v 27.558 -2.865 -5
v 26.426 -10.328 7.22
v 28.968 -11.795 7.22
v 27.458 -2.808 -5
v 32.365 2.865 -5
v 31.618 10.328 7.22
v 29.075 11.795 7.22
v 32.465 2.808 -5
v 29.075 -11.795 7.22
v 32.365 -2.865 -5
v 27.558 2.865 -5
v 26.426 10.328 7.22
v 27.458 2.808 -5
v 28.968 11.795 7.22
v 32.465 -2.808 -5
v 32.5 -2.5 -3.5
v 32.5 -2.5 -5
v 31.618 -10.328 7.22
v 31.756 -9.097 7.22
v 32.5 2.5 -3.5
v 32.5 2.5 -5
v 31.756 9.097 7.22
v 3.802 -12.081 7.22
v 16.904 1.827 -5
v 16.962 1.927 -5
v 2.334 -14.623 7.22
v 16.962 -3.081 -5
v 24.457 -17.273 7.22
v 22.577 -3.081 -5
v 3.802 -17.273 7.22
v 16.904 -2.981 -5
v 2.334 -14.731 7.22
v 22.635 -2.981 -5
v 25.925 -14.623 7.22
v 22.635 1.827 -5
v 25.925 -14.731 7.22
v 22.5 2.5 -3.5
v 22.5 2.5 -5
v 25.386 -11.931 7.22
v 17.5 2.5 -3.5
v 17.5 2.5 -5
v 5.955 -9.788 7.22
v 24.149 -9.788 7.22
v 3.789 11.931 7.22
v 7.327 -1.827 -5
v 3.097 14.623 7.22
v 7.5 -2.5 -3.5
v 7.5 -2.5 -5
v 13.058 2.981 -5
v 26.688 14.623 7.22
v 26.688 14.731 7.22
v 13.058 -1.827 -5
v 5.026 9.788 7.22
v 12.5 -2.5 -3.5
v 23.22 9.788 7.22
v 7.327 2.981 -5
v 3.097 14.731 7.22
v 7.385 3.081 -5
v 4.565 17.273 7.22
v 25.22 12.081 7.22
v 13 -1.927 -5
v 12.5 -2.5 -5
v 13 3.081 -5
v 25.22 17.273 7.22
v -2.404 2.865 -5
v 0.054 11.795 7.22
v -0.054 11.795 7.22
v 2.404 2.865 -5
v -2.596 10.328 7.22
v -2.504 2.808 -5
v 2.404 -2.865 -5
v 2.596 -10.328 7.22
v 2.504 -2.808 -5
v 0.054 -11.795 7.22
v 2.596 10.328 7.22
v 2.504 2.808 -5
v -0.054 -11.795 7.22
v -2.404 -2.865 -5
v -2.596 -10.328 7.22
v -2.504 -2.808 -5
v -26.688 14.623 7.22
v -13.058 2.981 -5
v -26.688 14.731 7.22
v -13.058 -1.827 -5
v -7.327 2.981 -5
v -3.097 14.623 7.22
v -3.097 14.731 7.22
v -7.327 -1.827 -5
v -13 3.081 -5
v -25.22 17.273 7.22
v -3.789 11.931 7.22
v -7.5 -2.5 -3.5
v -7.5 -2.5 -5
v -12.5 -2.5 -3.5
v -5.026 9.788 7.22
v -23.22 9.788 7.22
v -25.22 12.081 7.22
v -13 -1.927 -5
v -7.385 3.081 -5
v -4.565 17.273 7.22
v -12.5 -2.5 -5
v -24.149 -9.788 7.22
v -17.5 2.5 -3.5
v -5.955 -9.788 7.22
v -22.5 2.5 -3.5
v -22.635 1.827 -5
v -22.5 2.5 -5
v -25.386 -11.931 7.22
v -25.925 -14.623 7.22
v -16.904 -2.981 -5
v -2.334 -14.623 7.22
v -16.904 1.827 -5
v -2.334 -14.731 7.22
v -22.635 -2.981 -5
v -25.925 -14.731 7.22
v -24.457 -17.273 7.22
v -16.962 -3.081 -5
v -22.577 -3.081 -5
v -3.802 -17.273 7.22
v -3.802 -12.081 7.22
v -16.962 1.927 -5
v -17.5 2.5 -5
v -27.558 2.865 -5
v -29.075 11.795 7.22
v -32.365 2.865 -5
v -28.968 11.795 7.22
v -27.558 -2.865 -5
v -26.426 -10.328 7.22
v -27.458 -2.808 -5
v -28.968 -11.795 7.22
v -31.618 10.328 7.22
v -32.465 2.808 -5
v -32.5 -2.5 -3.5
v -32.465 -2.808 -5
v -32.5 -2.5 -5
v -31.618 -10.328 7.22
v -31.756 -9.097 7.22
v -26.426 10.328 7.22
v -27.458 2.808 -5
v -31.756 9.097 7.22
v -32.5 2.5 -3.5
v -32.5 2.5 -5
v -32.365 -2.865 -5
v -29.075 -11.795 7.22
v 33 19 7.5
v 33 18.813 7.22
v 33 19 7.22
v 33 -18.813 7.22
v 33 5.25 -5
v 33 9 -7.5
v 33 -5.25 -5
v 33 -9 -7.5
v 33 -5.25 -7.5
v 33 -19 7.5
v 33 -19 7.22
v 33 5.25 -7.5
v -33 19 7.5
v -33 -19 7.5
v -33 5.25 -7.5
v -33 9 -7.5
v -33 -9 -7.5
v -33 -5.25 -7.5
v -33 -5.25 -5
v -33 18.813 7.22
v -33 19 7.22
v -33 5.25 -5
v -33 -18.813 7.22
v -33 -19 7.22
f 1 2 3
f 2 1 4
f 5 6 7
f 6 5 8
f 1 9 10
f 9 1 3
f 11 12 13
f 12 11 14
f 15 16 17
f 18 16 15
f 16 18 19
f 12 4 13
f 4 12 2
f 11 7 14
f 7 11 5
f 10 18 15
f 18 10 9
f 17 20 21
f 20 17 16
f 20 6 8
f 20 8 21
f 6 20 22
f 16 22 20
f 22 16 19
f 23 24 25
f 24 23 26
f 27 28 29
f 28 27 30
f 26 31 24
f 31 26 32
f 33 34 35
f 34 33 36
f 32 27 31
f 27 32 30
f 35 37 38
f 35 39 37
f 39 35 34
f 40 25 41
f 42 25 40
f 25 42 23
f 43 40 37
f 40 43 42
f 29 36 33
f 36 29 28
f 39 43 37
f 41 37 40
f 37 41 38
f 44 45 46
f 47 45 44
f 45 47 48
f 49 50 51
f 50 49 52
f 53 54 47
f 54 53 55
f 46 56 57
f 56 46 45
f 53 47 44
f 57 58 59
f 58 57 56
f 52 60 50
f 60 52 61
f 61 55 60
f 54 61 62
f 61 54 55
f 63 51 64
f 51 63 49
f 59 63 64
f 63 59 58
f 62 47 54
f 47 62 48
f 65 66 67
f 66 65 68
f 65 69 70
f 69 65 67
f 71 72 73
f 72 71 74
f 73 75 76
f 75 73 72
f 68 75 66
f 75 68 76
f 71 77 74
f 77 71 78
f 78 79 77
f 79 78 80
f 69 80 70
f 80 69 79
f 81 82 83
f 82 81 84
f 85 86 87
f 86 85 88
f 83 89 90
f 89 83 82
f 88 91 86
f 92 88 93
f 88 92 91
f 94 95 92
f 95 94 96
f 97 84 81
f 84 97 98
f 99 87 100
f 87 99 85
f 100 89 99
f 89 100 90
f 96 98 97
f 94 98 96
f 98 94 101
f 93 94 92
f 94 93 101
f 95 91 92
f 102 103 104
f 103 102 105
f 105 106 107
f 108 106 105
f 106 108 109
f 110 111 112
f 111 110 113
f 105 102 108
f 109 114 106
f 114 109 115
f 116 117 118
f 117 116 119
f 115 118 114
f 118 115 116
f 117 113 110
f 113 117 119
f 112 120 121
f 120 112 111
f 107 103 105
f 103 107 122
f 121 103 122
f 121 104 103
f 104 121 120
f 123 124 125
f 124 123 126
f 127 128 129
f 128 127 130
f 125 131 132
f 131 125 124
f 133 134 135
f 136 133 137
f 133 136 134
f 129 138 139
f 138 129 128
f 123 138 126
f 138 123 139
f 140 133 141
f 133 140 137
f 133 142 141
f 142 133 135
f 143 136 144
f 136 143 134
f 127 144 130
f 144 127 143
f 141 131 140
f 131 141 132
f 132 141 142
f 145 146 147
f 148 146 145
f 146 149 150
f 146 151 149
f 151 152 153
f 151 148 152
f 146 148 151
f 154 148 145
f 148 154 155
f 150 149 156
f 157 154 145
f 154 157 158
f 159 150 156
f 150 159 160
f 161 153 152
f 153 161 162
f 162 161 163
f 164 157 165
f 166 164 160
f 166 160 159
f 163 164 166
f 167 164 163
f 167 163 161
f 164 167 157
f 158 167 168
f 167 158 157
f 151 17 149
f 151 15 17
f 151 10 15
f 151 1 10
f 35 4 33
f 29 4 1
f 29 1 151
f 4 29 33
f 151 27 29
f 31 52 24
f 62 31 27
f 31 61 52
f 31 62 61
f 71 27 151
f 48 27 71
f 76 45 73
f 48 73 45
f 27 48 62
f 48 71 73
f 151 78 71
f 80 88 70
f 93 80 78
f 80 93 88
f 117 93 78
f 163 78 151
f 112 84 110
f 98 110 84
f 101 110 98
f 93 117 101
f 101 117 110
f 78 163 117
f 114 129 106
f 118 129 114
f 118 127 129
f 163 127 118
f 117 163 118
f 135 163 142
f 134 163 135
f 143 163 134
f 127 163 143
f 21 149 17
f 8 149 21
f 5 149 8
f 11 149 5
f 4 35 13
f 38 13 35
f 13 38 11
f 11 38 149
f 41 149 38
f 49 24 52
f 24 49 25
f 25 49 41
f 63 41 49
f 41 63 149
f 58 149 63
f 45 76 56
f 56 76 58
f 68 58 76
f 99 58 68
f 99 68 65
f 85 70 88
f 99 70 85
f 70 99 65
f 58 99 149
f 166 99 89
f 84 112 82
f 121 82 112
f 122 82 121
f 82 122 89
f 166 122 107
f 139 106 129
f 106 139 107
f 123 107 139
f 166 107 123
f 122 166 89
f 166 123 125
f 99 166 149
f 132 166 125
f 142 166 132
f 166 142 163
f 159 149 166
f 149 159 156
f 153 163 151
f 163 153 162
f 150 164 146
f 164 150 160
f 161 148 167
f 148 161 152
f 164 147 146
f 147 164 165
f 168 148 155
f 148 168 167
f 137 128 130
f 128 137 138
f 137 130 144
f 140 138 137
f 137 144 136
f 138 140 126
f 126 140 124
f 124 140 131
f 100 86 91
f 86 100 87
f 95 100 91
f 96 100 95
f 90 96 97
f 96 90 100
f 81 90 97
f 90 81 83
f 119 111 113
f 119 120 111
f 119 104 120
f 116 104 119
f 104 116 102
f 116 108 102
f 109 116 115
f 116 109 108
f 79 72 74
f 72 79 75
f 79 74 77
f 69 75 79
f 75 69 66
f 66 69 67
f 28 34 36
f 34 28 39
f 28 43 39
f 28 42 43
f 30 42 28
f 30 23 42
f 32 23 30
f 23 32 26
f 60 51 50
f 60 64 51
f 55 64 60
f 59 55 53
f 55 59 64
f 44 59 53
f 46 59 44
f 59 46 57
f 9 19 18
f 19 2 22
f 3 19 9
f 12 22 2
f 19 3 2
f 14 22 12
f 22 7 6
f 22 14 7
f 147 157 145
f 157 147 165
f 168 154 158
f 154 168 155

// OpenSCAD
// WS2812 LED Strip Parameters - verified measurements
led_spacing = 10;      // 10mm between LED centers
strip_width = 10;      // 10mm wide LED strip
strip_height = 2;      // Keep same
tolerance = 0.5;       // Keep same
led_size = 5;         // 5mm square LED cutouts

// Updated Base Parameters
base_width = 66;      // Optimized smaller base
base_length = 38;     // Adjusted proportionally
base_height = 15;     // Increased by 25% from 25mm
base_space = 4;
// Updated 7-Segment Display Parameters
segment_h_length = 24;    // Increased horizontal length for wider number
segment_width = 6;        // Keep wider segments

// Add diffuser parameters
diffuser_height = .28;

// Define LED positions globally
led1 = [0, -3.0 * led_spacing];  // LED1
led2 = [0,-2.0 * led_spacing];  // LED2
led3 = [0,-1.0 * led_spacing];  // LED3
led4 = [0,0.0 * led_spacing];   // LED4 - Center LED
led5 = [0,1.0 * led_spacing];   // LED5
led6 = [0,2.0 * led_spacing];   // LED6
led7 = [0,3.0 * led_spacing];   // LED7

// Define segment positions globally - Wide and squished
seg_f = [-15, 14];     // F (top left vertical) - moved outward
seg_e = [-15, -14];    // E (bottom left vertical) - moved outward
seg_a = [0, 29];      // A (top horizontal) - same height
seg_g = [0, 0];       // G (middle horizontal) - unchanged
seg_b = [15, 15];      // B (top right vertical) - moved closer
seg_c = [15, -15];     // C (bottom right vertical) - moved closer
seg_d = [0, -29];     // D (bottom horizontal) - moved closer

// LED Strip Channel with wire channels - centered
module led_channel() {
    // Main channel exactly 10mm wide plus tolerance
    translate([-base_width/2 , -strip_width/2 - tolerance/2, -base_height/2])
        cube([base_width, strip_width + tolerance, strip_height + tolerance]);
}

// Single light pipe cavity with elongating shape
module light_cavity(led_pos, segment_pos, is_horizontal=false) {
    // Calculate heights for better progression
    z_bottom = -base_height/2 + strip_height;
    z_top = base_height/2;
    total_height = z_top - z_bottom;
    
    hull() {
        // Bottom (at LED) - small square
        translate([led_pos[0] - led_size/2, led_pos[1] - led_size/2, z_bottom])
            cube([led_size, led_size, 2]);
     
            
        // Top (at segment) - full segment shape
        translate([segment_pos[0], segment_pos[1], z_top ]) {
            rotate([0, 0, is_horizontal ? 0 : 90])
                linear_extrude(height=2)
                    segment(segment_h_length, segment_width);
        }
    }
    
}

// All light cavities with corrected segment positions and mirroring
module all_cavities(visualization=false) {
    
    rotate([0, 0, 90]) {
        // Light paths
        light_cavity(led1, seg_d, true);   // LED1 → F (vertical)
        light_cavity(led2, seg_e, false);   // LED2 → E (vertical)
        light_cavity(led3, seg_c, false);    // LED3 → A (horizontal)
        light_cavity(led4, seg_g, true);    // LED4 → G (horizontal)
        light_cavity(led5, seg_b, false);   // LED5 → B (vertical)
        light_cavity(led6, seg_f, false);   // LED6 → C (vertical)
        light_cavity(led7, seg_a, true);    // LED6 → D (horizontal)
    }
}

// Base with LED channel, cavities, 
module base() {
    difference() {
        // Main block
        cube([base_width, base_length, base_height], center=true);             
        // LED channel
        led_channel();
        // Light pipe cavities
        all_cavities(false);  // Use same paths for actual cavities
    }
}

module segment(length, width) {
    // Elongated hexagonal shape
    hull() {
        translate([-length/2 + width/2, 0, 0]) 
            circle(d=width, $fn=6);
        translate([length/2 - width/2, 0, 0])  
            circle(d=width, $fn=6);
    }
}

// Diffuser layer module
module diffuser_layer() {
    translate([0, 0, (base_height/2) - diffuser_height/2])  // Changed to sit directly on base
        cube([base_width, base_length, diffuser_height], center=true);
}

// // Render just the paths in red with slight transparency
// //all_cavities(true);  // Show paths
// union() {
//    base();
// //    diffuser_layer();
// }
   
module side_cut(side = "left") {
    color("Green", alpha=0.9);
    if (side == "left") {
    rotate([90, 0, 90])
    translate([0, 0, -base_width/2])
        linear_extrude(height=base_width)
            polygon(
            points=[
                [(strip_width/2)+base_space,0 - base_height/2],
                [0+base_length/2,0 - base_height/2],
                [0+base_length/2, base_height/2]
                ], 
            paths=[[0,1,2]]
        );
    } else if (side == "right") {
        rotate([90, 0, 90])
        translate([0, 0, -base_width/2])
            linear_extrude(height=base_width)
                polygon(
                points=[
                    [(-strip_width/2)-base_space,0 - base_height/2],
                    [0-base_length/2,0 - base_height/2],
                    [0-base_length/2, base_height/2]
                    ], 
                paths=[[0,1,2]]
            );
    }
}


// New module for the intersection shape
module intersection_layer() {
        color("Red", alpha=0.9)  // Semi-transparent to visualize

        intersection() {
            all_cavities(true);
            diffuser_layer();
        };
    } 

// union(){
// Replace the final union() with:
// color("Green", alpha=0.9) {
// side_cut("left");
// side_cut("right");
// }
    union() {
         color("Yellow", alpha=0.9) {

    difference() {
        base();
        side_cut("left");
        side_cut("right");
    }
         }
    color("White", alpha=0.2) {
        diffuser_layer();

    }  
    
 }

// intersection_layer();
// diffuser_layer();
